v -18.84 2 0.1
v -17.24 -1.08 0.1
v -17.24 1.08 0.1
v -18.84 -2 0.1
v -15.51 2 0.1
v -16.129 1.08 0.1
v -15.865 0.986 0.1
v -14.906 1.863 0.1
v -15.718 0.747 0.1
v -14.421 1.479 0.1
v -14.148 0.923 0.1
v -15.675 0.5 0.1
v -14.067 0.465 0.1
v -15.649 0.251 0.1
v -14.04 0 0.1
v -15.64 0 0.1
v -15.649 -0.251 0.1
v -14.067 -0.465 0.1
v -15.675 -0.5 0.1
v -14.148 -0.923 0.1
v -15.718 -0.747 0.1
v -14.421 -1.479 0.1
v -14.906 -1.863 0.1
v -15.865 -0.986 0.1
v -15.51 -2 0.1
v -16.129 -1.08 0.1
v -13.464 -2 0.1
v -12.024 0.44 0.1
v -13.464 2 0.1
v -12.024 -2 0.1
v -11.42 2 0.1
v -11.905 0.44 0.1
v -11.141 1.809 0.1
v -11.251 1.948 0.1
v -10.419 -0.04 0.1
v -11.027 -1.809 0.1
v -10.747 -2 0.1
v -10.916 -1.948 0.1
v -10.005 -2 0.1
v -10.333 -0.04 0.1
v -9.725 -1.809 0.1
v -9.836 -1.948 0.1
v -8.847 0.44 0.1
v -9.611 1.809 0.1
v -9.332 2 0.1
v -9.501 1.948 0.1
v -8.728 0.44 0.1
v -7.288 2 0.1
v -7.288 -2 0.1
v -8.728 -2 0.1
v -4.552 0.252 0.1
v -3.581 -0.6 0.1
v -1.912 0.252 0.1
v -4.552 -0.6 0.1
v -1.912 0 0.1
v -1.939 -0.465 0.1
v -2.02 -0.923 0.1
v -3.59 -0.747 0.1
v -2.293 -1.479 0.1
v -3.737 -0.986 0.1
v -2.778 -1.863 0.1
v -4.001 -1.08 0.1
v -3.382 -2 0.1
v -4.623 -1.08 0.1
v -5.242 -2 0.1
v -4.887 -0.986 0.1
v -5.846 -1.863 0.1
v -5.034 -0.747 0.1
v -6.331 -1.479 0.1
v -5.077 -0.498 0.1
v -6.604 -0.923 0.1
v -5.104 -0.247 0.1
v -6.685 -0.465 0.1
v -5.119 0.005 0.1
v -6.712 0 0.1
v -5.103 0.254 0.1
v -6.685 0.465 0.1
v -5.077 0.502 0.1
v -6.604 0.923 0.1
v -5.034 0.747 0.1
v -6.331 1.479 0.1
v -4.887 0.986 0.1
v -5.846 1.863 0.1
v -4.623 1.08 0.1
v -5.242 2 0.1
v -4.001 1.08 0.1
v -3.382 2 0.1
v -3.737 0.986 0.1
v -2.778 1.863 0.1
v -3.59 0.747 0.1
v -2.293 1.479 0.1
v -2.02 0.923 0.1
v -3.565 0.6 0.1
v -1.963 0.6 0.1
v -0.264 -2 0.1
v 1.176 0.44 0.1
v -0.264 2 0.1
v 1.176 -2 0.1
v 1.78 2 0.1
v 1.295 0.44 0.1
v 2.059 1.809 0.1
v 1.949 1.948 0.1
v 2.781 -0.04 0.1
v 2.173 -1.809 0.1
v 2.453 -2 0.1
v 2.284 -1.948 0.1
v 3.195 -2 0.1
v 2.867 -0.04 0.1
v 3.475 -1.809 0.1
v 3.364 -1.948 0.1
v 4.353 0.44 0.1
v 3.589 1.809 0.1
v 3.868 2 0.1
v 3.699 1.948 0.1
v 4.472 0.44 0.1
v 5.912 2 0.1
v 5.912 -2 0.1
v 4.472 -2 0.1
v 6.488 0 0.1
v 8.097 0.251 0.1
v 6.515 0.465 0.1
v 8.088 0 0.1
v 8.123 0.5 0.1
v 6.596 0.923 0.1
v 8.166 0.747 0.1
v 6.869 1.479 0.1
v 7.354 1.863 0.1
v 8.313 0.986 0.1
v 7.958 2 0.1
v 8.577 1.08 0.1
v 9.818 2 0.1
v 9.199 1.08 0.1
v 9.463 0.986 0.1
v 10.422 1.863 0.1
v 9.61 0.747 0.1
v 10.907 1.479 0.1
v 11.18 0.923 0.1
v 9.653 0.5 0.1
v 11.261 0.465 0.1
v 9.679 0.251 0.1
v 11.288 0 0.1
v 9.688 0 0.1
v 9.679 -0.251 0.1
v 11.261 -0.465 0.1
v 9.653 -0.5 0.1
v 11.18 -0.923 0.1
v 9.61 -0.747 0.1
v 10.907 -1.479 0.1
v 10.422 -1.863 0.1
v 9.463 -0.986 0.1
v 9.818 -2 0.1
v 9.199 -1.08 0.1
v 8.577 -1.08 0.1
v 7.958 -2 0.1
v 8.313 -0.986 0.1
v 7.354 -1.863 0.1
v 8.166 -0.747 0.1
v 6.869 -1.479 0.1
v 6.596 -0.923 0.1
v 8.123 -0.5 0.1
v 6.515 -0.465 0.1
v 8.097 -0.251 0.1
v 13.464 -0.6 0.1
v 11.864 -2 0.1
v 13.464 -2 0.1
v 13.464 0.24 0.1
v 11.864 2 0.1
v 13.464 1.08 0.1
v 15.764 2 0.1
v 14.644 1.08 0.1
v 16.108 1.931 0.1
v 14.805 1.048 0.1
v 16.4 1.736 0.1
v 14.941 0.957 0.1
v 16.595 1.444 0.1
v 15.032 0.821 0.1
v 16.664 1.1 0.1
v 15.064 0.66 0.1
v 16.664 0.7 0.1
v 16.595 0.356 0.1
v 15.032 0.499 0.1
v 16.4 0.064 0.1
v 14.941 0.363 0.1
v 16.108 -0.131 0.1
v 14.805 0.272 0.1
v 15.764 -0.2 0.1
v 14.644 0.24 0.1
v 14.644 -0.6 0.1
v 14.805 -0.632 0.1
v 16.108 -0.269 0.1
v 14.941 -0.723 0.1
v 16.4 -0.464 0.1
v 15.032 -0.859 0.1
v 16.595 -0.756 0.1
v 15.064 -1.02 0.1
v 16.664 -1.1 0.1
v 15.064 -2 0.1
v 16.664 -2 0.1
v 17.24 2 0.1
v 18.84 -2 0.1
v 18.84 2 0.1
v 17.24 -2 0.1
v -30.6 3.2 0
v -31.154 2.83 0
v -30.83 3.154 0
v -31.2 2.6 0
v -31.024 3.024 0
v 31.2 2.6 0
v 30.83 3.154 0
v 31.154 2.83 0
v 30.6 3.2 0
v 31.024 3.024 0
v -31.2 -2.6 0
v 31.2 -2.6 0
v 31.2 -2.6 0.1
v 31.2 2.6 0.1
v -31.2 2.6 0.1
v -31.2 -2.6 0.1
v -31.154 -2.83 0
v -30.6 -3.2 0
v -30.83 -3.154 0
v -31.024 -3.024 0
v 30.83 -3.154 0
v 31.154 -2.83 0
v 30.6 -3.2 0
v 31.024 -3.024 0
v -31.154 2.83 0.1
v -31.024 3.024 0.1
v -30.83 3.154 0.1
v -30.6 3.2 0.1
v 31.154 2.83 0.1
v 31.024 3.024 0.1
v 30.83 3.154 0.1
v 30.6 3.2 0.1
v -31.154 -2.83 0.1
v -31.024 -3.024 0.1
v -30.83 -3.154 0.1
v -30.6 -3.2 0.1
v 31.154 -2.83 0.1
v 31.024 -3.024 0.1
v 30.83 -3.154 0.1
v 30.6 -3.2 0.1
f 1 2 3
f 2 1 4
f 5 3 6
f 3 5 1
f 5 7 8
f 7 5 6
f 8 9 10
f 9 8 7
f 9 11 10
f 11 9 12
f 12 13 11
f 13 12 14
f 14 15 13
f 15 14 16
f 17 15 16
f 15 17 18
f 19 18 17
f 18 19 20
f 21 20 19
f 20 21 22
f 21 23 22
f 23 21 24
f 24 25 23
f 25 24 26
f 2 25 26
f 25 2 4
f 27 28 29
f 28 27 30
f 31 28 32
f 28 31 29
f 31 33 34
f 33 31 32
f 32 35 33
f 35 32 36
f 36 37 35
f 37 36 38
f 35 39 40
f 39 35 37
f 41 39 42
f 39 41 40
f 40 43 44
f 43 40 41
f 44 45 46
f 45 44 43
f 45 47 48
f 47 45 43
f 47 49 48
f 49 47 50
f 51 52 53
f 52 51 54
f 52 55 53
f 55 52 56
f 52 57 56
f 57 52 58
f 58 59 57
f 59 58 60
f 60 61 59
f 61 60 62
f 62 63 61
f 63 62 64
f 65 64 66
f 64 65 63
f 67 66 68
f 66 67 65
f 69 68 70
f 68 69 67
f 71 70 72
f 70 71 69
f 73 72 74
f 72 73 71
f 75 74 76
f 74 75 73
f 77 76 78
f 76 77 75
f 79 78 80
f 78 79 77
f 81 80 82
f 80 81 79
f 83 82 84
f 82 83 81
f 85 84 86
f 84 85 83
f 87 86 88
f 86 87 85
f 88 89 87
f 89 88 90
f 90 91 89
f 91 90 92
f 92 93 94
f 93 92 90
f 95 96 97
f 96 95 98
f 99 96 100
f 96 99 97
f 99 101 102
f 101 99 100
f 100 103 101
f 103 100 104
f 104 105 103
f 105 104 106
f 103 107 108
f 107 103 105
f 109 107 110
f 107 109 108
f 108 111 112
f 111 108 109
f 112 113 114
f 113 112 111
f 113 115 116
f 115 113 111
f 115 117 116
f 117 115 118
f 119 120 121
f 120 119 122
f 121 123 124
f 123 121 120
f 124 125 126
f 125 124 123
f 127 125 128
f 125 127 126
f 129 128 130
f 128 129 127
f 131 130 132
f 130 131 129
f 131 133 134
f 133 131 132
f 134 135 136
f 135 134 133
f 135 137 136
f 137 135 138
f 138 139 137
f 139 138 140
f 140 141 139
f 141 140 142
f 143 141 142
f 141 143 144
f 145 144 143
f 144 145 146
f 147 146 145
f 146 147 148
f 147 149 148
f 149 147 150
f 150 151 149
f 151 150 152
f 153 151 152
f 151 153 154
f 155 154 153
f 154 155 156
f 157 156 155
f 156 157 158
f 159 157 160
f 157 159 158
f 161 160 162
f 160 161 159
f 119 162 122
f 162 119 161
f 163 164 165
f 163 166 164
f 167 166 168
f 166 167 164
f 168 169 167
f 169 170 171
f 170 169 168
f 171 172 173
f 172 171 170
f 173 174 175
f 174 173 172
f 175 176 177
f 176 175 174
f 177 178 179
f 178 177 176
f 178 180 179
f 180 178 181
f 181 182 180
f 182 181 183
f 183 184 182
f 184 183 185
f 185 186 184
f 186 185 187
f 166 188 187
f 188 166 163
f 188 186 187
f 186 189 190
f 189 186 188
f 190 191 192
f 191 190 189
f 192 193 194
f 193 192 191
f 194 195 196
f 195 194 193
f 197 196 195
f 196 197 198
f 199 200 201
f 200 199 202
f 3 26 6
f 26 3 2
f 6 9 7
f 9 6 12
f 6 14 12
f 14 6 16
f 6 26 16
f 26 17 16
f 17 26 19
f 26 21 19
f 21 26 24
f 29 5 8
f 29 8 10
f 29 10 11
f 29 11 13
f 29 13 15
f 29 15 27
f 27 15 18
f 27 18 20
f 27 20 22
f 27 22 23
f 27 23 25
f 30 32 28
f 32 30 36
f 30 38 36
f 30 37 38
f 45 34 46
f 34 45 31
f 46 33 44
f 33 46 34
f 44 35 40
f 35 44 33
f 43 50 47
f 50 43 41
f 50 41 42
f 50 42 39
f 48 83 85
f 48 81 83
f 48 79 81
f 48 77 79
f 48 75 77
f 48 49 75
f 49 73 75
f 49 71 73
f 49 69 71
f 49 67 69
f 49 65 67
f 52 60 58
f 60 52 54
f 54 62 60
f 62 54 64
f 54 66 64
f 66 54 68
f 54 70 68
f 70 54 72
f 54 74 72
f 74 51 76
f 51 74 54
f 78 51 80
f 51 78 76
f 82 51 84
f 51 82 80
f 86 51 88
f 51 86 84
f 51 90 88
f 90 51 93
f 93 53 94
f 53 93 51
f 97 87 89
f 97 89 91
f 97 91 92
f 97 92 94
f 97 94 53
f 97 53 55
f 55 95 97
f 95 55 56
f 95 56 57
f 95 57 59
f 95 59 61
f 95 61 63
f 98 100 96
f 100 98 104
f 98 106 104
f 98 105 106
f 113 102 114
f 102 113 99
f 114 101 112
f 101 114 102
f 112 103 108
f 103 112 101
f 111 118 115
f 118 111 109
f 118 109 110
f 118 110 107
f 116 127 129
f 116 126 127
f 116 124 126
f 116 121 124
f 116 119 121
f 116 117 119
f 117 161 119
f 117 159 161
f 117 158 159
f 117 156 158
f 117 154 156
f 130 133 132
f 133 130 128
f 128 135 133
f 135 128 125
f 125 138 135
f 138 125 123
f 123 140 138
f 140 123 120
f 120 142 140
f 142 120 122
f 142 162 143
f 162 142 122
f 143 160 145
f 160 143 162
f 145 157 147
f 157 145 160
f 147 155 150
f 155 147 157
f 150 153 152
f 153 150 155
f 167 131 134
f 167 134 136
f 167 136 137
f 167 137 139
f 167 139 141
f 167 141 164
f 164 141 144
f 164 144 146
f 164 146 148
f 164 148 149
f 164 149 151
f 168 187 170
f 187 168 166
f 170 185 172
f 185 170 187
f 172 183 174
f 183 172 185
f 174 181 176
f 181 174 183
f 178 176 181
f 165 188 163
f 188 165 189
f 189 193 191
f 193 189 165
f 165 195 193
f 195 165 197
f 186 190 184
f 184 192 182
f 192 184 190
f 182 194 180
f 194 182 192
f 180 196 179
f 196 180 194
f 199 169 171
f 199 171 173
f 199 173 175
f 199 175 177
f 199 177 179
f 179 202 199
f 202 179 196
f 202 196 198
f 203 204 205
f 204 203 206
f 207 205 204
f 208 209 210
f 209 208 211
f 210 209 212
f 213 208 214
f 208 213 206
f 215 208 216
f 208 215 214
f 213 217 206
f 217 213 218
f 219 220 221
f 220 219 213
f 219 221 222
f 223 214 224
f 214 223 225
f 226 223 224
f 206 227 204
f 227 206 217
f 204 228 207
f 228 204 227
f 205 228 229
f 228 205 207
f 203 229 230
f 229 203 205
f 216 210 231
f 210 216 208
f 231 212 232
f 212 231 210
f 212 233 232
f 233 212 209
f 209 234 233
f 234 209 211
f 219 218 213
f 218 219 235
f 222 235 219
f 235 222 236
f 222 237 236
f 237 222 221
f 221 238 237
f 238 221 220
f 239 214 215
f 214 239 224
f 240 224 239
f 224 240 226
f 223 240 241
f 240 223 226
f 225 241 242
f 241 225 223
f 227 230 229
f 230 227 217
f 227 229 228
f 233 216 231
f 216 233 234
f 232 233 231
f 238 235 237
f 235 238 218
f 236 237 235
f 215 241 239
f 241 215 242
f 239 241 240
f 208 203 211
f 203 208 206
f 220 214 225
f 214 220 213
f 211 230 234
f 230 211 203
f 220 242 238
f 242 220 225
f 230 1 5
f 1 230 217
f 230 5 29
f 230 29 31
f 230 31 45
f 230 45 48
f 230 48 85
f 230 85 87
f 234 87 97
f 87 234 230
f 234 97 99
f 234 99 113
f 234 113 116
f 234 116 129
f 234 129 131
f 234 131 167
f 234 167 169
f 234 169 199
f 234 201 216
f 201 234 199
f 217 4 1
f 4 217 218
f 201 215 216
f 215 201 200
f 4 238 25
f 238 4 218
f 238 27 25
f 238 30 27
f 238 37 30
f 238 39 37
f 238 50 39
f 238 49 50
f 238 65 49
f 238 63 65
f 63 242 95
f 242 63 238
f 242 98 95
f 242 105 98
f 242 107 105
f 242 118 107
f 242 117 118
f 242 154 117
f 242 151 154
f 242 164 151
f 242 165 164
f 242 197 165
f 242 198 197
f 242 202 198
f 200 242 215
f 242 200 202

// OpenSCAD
// file: ../p/box3u12.scad
use <../lib.scad>
function ldraw_lib__box3u12() = [
// 0 Box with 3 Parallel Faces without Any Edges
// 0 Name: box3u12.dat
// 0 Author: J.C. Tchang [tchang]
// 0 !LDRAW_ORG Primitive UPDATE 2014-02
// 0 !LICENSE Licensed under CC BY 4.0 : see CAreadme.txt
// 
// 0 BFC CERTIFY CCW
  [0,"BFC","CERTIFY"],
  [0,"BFC","CCW"],
// 
// 0 !HISTORY 2014-12-23 [PTadmin] Official Update 2014-02
// 
// 
// 4 16 -1 1 1 1 1 1 1 1 -1 -1 1 -1
  [4,16,-1,1,1,1,1,1,1,1,-1,-1,1,-1],
// 4 16 -1 1 1 -1 0 1 1 0 1 1 1 1
  [4,16,-1,1,1,-1,0,1,1,0,1,1,1,1],
// 4 16 1 1 -1 1 0 -1 -1 0 -1 -1 1 -1
  [4,16,1,1,-1,1,0,-1,-1,0,-1,-1,1,-1],
];
module ldraw_lib__box3u12(step=0, col=false, unit=2/5, alt=false, line=0.2, solid=!$preview)
    makepoly(ldraw_lib__box3u12(), step=step, col=col, unit=unit, alt=alt, line=line, solid=solid);
ldraw_lib__box3u12(line=0.2);
// file: ../p/1-4cyli.scad
use <../lib.scad>
function ldraw_lib__1_4cyli() = [
// 0 Cylinder 0.25
// 0 Name: 1-4cyli.dat
// 0 Author: James Jessiman
// 0 !LDRAW_ORG Primitive UPDATE 2012-01
// 0 !LICENSE Licensed under CC BY 4.0 : see CAreadme.txt
// 
// 0 BFC CERTIFY CCW
  [0,"BFC","CERTIFY"],
  [0,"BFC","CCW"],
// 
// 0 !HISTORY 2002-03-23 [sbliss] Added BFC statement.
// 0 !HISTORY 2002-04-25 [PTadmin] Official Update 2002-02
// 0 !HISTORY 2007-06-22 [PTadmin] Header formatted for Contributor Agreement
// 0 !HISTORY 2008-07-01 [PTadmin] Official Update 2008-01
// 0 !HISTORY 2012-02-16 [Philo] Changed to CCW
// 0 !HISTORY 2012-03-30 [PTadmin] Official Update 2012-01
// 
// 
// 4 16 1 1 0 0.9239 1 0.3827 0.9239 0 0.3827 1 0 0
  [4,16,1,1,0,0.9239,1,0.3827,0.9239,0,0.3827,1,0,0],
// 5 24 1 0 0 1 1 0 0.9239 0 0.3827 1 0 -1
  [5,24,1,0,0,1,1,0,0.9239,0,0.3827,1,0,-1],
// 4 16 0.9239 1 0.3827 0.7071 1 0.7071 0.7071 0 0.7071 0.9239 0 0.3827
  [4,16,0.9239,1,0.3827,0.7071,1,0.7071,0.7071,0,0.7071,0.9239,0,0.3827],
// 5 24 0.9239 0 0.3827 0.9239 1 0.3827 0.7071 0 0.7071 1 0 0
  [5,24,0.9239,0,0.3827,0.9239,1,0.3827,0.7071,0,0.7071,1,0,0],
// 4 16 0.7071 1 0.7071 0.3827 1 0.9239 0.3827 0 0.9239 0.7071 0 0.7071
  [4,16,0.7071,1,0.7071,0.3827,1,0.9239,0.3827,0,0.9239,0.7071,0,0.7071],
// 5 24 0.7071 0 0.7071 0.7071 1 0.7071 0.3827 0 0.9239 0.9239 0 0.3827
  [5,24,0.7071,0,0.7071,0.7071,1,0.7071,0.3827,0,0.9239,0.9239,0,0.3827],
// 4 16 0.3827 1 0.9239 0 1 1 0 0 1 0.3827 0 0.9239
  [4,16,0.3827,1,0.9239,0,1,1,0,0,1,0.3827,0,0.9239],
// 5 24 0.3827 0 0.9239 0.3827 1 0.9239 0 0 1 0.7071 0 0.7071
  [5,24,0.3827,0,0.9239,0.3827,1,0.9239,0,0,1,0.7071,0,0.7071],
// 5 24 0 0 1 0 1 1 0.3827 0 0.9239 -1 0 1
  [5,24,0,0,1,0,1,1,0.3827,0,0.9239,-1,0,1],
];
module ldraw_lib__1_4cyli(step=0, col=false, unit=2/5, alt=false, line=0.2, solid=!$preview)
    makepoly(ldraw_lib__1_4cyli(), step=step, col=col, unit=unit, alt=alt, line=line, solid=solid);
ldraw_lib__1_4cyli(line=0.2);
// file: ../p/1-4chrd.scad
use <../lib.scad>
function ldraw_lib__1_4chrd() = [
// 0 Chord 0.25
// 0 Name: 1-4chrd.dat
// 0 Author: Max Martin Richter [MMR1988]
// 0 !LDRAW_ORG Primitive UPDATE 2023-05
// 0 !LICENSE Licensed under CC BY 4.0 : see CAreadme.txt
// 
// 0 BFC CERTIFY CCW
  [0,"BFC","CERTIFY"],
  [0,"BFC","CCW"],
// 
// 0 !HISTORY 2004-04-22 [PTadmin] Official Update 2004-02
// 0 !HISTORY 2007-10-09 [PTadmin] Header formatted for Contributor Agreement
// 0 !HISTORY 2008-07-01 [PTadmin] Official Update 2008-01
// 0 !HISTORY 2012-08-02 [MMR1988] Re-creation with PrimGen2 and Rectifier
// 0 !HISTORY 2012-08-09 [PTadmin] Official Update 2012-02
// 0 !HISTORY 2023-10-27 [OrionP] Change author to MMR1988 from hafhead
// 0 !HISTORY 2023-10-31 [OrionP] Official Update 2023-05
// 
// 4 16 0.9239 0 0.3827 0.3827 0 0.9239 0 0 1 1 0 0
  [4,16,0.9239,0,0.3827,0.3827,0,0.9239,0,0,1,1,0,0],
// 3 16 0.7071 0 0.7071 0.3827 0 0.9239 0.9239 0 0.3827
  [3,16,0.7071,0,0.7071,0.3827,0,0.9239,0.9239,0,0.3827],
];
module ldraw_lib__1_4chrd(step=0, col=false, unit=2/5, alt=false, line=0.2, solid=!$preview)
    makepoly(ldraw_lib__1_4chrd(), step=step, col=col, unit=unit, alt=alt, line=line, solid=solid);
ldraw_lib__1_4chrd(line=0.2);
// main file
use <../lib.scad>
use <../p/1-4chrd.scad>
use <../p/1-4cyli.scad>
use <../p/box3u12.scad>
use <../p/logo-dmg-mori-box.scad>
use <../p/logo-dmg-mori-text.scad>
function ldraw_lib__6148328l() = [
// 0 Sticker  0.8 x  7.8 with White DMG MORI Logo on Dark Grey Background
// 0 Name: 6148328l.dat
// 0 Author: Massimo Maso [Sirio]
// 0 !LDRAW_ORG Part UPDATE 2024-05
// 0 !LICENSE Licensed under CC BY 4.0 : see CAreadme.txt
// 
// 0 BFC CERTIFY CCW
  [0,"BFC","CERTIFY"],
  [0,"BFC","CCW"],
// 
// 0 !KEYWORDS 917K, 919, Bricklink 75876stk01, Brickowl 852010, Hybrid, Pit Lane
// 0 !KEYWORDS Porsche, Rebrickable 26357, set 75876, Speed Champions
// 
// 0 !HISTORY 2024-06-30 [OrionP] Official Update 2024-05
// 
// 0 // Logo primitive
// 1 15 0 -.25 0 1 0 0 0 1 0 0 0 1 logo-dmg-mori-text.dat
  [1,15,0,-.25,0,1,0,0,0,1,0,0,0,1, ldraw_lib__logo_dmg_mori_text()],
// 1 72 0 -.25 0 1 0 0 0 1 0 0 0 1 logo-dmg-mori-box.dat
  [1,72,0,-.25,0,1,0,0,0,1,0,0,0,1, ldraw_lib__logo_dmg_mori_box()],
// 0 // Primitives
// 1 16 -76.5 0 6.5 -1.5 0 0 0 -1 0 0 0 1.5 1-4chrd.dat
  [1,16,-76.5,0,6.5,-1.5,0,0,0,-1,0,0,0,1.5, ldraw_lib__1_4chrd()],
// 1 16 76.5 0 6.5 1.5 0 0 0 -1 0 0 0 1.5 1-4chrd.dat
  [1,16,76.5,0,6.5,1.5,0,0,0,-1,0,0,0,1.5, ldraw_lib__1_4chrd()],
// 1 16 0 -.25 0 0 0 78 0 .25 0 6.5 0 0 box3u12.dat
  [1,16,0,-.25,0,0,0,78,0,.25,0,6.5,0,0, ldraw_lib__box3u12()],
// 1 16 -76.5 0 -6.5 -1.5 0 0 0 -1 0 0 0 -1.5 1-4chrd.dat
  [1,16,-76.5,0,-6.5,-1.5,0,0,0,-1,0,0,0,-1.5, ldraw_lib__1_4chrd()],
// 1 16 76.5 0 -6.5 1.5 0 0 0 -1 0 0 0 -1.5 1-4chrd.dat
  [1,16,76.5,0,-6.5,1.5,0,0,0,-1,0,0,0,-1.5, ldraw_lib__1_4chrd()],
// 1 16 -76.5 0 6.5 -1.5 0 0 0 -.25 0 0 0 1.5 1-4cyli.dat
  [1,16,-76.5,0,6.5,-1.5,0,0,0,-.25,0,0,0,1.5, ldraw_lib__1_4cyli()],
// 1 16 76.5 0 6.5 1.5 0 0 0 -.25 0 0 0 1.5 1-4cyli.dat
  [1,16,76.5,0,6.5,1.5,0,0,0,-.25,0,0,0,1.5, ldraw_lib__1_4cyli()],
// 1 16 -76.5 0 -6.5 -1.5 0 0 0 -.25 0 0 0 -1.5 1-4cyli.dat
  [1,16,-76.5,0,-6.5,-1.5,0,0,0,-.25,0,0,0,-1.5, ldraw_lib__1_4cyli()],
// 1 16 76.5 0 -6.5 1.5 0 0 0 -.25 0 0 0 -1.5 1-4cyli.dat
  [1,16,76.5,0,-6.5,1.5,0,0,0,-.25,0,0,0,-1.5, ldraw_lib__1_4cyli()],
// 1 72 -76.5 -.25 6.5 -1.5 0 0 0 1 0 0 0 1.5 1-4chrd.dat
  [1,72,-76.5,-.25,6.5,-1.5,0,0,0,1,0,0,0,1.5, ldraw_lib__1_4chrd()],
// 1 72 76.5 -.25 6.5 1.5 0 0 0 1 0 0 0 1.5 1-4chrd.dat
  [1,72,76.5,-.25,6.5,1.5,0,0,0,1,0,0,0,1.5, ldraw_lib__1_4chrd()],
// 1 72 -76.5 -.25 -6.5 -1.5 0 0 0 1 0 0 0 -1.5 1-4chrd.dat
  [1,72,-76.5,-.25,-6.5,-1.5,0,0,0,1,0,0,0,-1.5, ldraw_lib__1_4chrd()],
// 1 72 76.5 -.25 -6.5 1.5 0 0 0 1 0 0 0 -1.5 1-4chrd.dat
  [1,72,76.5,-.25,-6.5,1.5,0,0,0,1,0,0,0,-1.5, ldraw_lib__1_4chrd()],
// 0 // Bottom faces
// 4 16 76.5 0 8 78 0 6.5 -78 0 6.5 -76.5 0 8
  [4,16,76.5,0,8,78,0,6.5,-78,0,6.5,-76.5,0,8],
// 4 16 76.5 0 -8 -76.5 0 -8 -78 0 -6.5 78 0 -6.5
  [4,16,76.5,0,-8,-76.5,0,-8,-78,0,-6.5,78,0,-6.5],
// 0 // Lateral faces
// 4 16 -76.5 0 8 -76.5 -.25 8 76.5 -.25 8 76.5 0 8
  [4,16,-76.5,0,8,-76.5,-.25,8,76.5,-.25,8,76.5,0,8],
// 4 16 -76.5 0 -8 76.5 0 -8 76.5 -.25 -8 -76.5 -.25 -8
  [4,16,-76.5,0,-8,76.5,0,-8,76.5,-.25,-8,-76.5,-.25,-8],
// 0 // Top faces
// 4 72 -76.5 -.25 8 -78 -.25 6.5 -47.1 -.25 5 -38.7754 -.25 5
  [4,72,-76.5,-.25,8,-78,-.25,6.5,-47.1,-.25,5,-38.7754,-.25,5],
// 3 72 -76.5 -.25 8 -38.7754 -.25 5 -33.66 -.25 5
  [3,72,-76.5,-.25,8,-38.7754,-.25,5,-33.66,-.25,5],
// 3 72 -76.5 -.25 8 -33.66 -.25 5 -28.5501 -.25 5
  [3,72,-76.5,-.25,8,-33.66,-.25,5,-28.5501,-.25,5],
// 3 72 -76.5 -.25 8 -28.5501 -.25 5 -23.3299 -.25 5
  [3,72,-76.5,-.25,8,-28.5501,-.25,5,-23.3299,-.25,5],
// 3 72 -76.5 -.25 8 -23.3299 -.25 5 -18.22 -.25 5
  [3,72,-76.5,-.25,8,-23.3299,-.25,5,-18.22,-.25,5],
// 3 72 -76.5 -.25 8 -18.22 -.25 5 -13.1046 -.25 5
  [3,72,-76.5,-.25,8,-18.22,-.25,5,-13.1046,-.25,5],
// 3 72 -76.5 -.25 8 -13.1046 -.25 5 -8.4554 -.25 5
  [3,72,-76.5,-.25,8,-13.1046,-.25,5,-8.4554,-.25,5],
// 4 72 -76.5 -.25 8 -8.4554 -.25 5 -.66 -.25 5 76.5 -.25 8
  [4,72,-76.5,-.25,8,-8.4554,-.25,5,-.66,-.25,5,76.5,-.25,8],
// 3 72 76.5 -.25 8 -.66 -.25 5 4.4499 -.25 5
  [3,72,76.5,-.25,8,-.66,-.25,5,4.4499,-.25,5],
// 3 72 76.5 -.25 8 4.4499 -.25 5 9.6701 -.25 5
  [3,72,76.5,-.25,8,4.4499,-.25,5,9.6701,-.25,5],
// 3 72 76.5 -.25 8 9.6701 -.25 5 14.78 -.25 5
  [3,72,76.5,-.25,8,9.6701,-.25,5,14.78,-.25,5],
// 3 72 76.5 -.25 8 14.78 -.25 5 19.8955 -.25 5
  [3,72,76.5,-.25,8,14.78,-.25,5,19.8955,-.25,5],
// 3 72 76.5 -.25 8 19.8955 -.25 5 24.5446 -.25 5
  [3,72,76.5,-.25,8,19.8955,-.25,5,24.5446,-.25,5],
// 3 72 76.5 -.25 8 24.5446 -.25 5 29.66 -.25 5
  [3,72,76.5,-.25,8,24.5446,-.25,5,29.66,-.25,5],
// 3 72 76.5 -.25 8 29.66 -.25 5 39.41 -.25 5
  [3,72,76.5,-.25,8,29.66,-.25,5,39.41,-.25,5],
// 3 72 76.5 -.25 8 39.41 -.25 5 43.1 -.25 5
  [3,72,76.5,-.25,8,39.41,-.25,5,43.1,-.25,5],
// 4 72 76.5 -.25 8 43.1 -.25 5 47.1 -.25 5 78 -.25 6.5
  [4,72,76.5,-.25,8,43.1,-.25,5,47.1,-.25,5,78,-.25,6.5],
// 4 72 -78 -.25 6.5 -78 -.25 -6.5 -47.1 -.25 -5 -47.1 -.25 5
  [4,72,-78,-.25,6.5,-78,-.25,-6.5,-47.1,-.25,-5,-47.1,-.25,5],
// 4 72 78 -.25 6.5 47.1 -.25 5 47.1 -.25 -5 78 -.25 -6.5
  [4,72,78,-.25,6.5,47.1,-.25,5,47.1,-.25,-5,78,-.25,-6.5],
// 4 72 -76.5 -.25 -8 -38.7754 -.25 -5 -47.1 -.25 -5 -78 -.25 -6.5
  [4,72,-76.5,-.25,-8,-38.7754,-.25,-5,-47.1,-.25,-5,-78,-.25,-6.5],
// 3 72 -76.5 -.25 -8 -33.66 -.25 -5 -38.7754 -.25 -5
  [3,72,-76.5,-.25,-8,-33.66,-.25,-5,-38.7754,-.25,-5],
// 3 72 -76.5 -.25 -8 -30.06 -.25 -5 -33.66 -.25 -5
  [3,72,-76.5,-.25,-8,-30.06,-.25,-5,-33.66,-.25,-5],
// 3 72 -76.5 -.25 -8 -26.8677 -.25 -5 -30.06 -.25 -5
  [3,72,-76.5,-.25,-8,-26.8677,-.25,-5,-30.06,-.25,-5],
// 3 72 -76.5 -.25 -8 -25.0123 -.25 -5 -26.8677 -.25 -5
  [3,72,-76.5,-.25,-8,-25.0123,-.25,-5,-26.8677,-.25,-5],
// 3 72 -76.5 -.25 -8 -21.82 -.25 -5 -25.0123 -.25 -5
  [3,72,-76.5,-.25,-8,-21.82,-.25,-5,-25.0123,-.25,-5],
// 3 72 -76.5 -.25 -8 -18.22 -.25 -5 -21.82 -.25 -5
  [3,72,-76.5,-.25,-8,-18.22,-.25,-5,-21.82,-.25,-5],
// 3 72 -76.5 -.25 -8 -13.1046 -.25 -5 -18.22 -.25 -5
  [3,72,-76.5,-.25,-8,-13.1046,-.25,-5,-18.22,-.25,-5],
// 3 72 -76.5 -.25 -8 -8.4554 -.25 -5 -13.1046 -.25 -5
  [3,72,-76.5,-.25,-8,-8.4554,-.25,-5,-13.1046,-.25,-5],
// 4 72 -76.5 -.25 -8 76.5 -.25 -8 -.66 -.25 -5 -8.4554 -.25 -5
  [4,72,-76.5,-.25,-8,76.5,-.25,-8,-.66,-.25,-5,-8.4554,-.25,-5],
// 3 72 76.5 -.25 -8 2.94 -.25 -5 -.66 -.25 -5
  [3,72,76.5,-.25,-8,2.94,-.25,-5,-.66,-.25,-5],
// 3 72 76.5 -.25 -8 6.1323 -.25 -5 2.94 -.25 -5
  [3,72,76.5,-.25,-8,6.1323,-.25,-5,2.94,-.25,-5],
// 3 72 76.5 -.25 -8 7.9877 -.25 -5 6.1323 -.25 -5
  [3,72,76.5,-.25,-8,7.9877,-.25,-5,6.1323,-.25,-5],
// 3 72 76.5 -.25 -8 11.18 -.25 -5 7.9877 -.25 -5
  [3,72,76.5,-.25,-8,11.18,-.25,-5,7.9877,-.25,-5],
// 3 72 76.5 -.25 -8 14.78 -.25 -5 11.18 -.25 -5
  [3,72,76.5,-.25,-8,14.78,-.25,-5,11.18,-.25,-5],
// 3 72 76.5 -.25 -8 19.8955 -.25 -5 14.78 -.25 -5
  [3,72,76.5,-.25,-8,19.8955,-.25,-5,14.78,-.25,-5],
// 3 72 76.5 -.25 -8 24.5446 -.25 -5 19.8955 -.25 -5
  [3,72,76.5,-.25,-8,24.5446,-.25,-5,19.8955,-.25,-5],
// 3 72 76.5 -.25 -8 29.66 -.25 -5 24.5446 -.25 -5
  [3,72,76.5,-.25,-8,29.66,-.25,-5,24.5446,-.25,-5],
// 3 72 76.5 -.25 -8 33.66 -.25 -5 29.66 -.25 -5
  [3,72,76.5,-.25,-8,33.66,-.25,-5,29.66,-.25,-5],
// 3 72 76.5 -.25 -8 37.66 -.25 -5 33.66 -.25 -5
  [3,72,76.5,-.25,-8,37.66,-.25,-5,33.66,-.25,-5],
// 3 72 76.5 -.25 -8 41.66 -.25 -5 37.66 -.25 -5
  [3,72,76.5,-.25,-8,41.66,-.25,-5,37.66,-.25,-5],
// 3 72 76.5 -.25 -8 43.1 -.25 -5 41.66 -.25 -5
  [3,72,76.5,-.25,-8,43.1,-.25,-5,41.66,-.25,-5],
// 4 72 76.5 -.25 -8 78 -.25 -6.5 47.1 -.25 -5 43.1 -.25 -5
  [4,72,76.5,-.25,-8,78,-.25,-6.5,47.1,-.25,-5,43.1,-.25,-5],
];
module ldraw_lib__6148328l(step=0, col=false, unit=2/5, alt=false, line=0.2, solid=!$preview)
    makepoly(ldraw_lib__6148328l(), step=step, col=col, unit=unit, alt=alt, line=line, solid=solid);
ldraw_lib__6148328l(line=0.2);
